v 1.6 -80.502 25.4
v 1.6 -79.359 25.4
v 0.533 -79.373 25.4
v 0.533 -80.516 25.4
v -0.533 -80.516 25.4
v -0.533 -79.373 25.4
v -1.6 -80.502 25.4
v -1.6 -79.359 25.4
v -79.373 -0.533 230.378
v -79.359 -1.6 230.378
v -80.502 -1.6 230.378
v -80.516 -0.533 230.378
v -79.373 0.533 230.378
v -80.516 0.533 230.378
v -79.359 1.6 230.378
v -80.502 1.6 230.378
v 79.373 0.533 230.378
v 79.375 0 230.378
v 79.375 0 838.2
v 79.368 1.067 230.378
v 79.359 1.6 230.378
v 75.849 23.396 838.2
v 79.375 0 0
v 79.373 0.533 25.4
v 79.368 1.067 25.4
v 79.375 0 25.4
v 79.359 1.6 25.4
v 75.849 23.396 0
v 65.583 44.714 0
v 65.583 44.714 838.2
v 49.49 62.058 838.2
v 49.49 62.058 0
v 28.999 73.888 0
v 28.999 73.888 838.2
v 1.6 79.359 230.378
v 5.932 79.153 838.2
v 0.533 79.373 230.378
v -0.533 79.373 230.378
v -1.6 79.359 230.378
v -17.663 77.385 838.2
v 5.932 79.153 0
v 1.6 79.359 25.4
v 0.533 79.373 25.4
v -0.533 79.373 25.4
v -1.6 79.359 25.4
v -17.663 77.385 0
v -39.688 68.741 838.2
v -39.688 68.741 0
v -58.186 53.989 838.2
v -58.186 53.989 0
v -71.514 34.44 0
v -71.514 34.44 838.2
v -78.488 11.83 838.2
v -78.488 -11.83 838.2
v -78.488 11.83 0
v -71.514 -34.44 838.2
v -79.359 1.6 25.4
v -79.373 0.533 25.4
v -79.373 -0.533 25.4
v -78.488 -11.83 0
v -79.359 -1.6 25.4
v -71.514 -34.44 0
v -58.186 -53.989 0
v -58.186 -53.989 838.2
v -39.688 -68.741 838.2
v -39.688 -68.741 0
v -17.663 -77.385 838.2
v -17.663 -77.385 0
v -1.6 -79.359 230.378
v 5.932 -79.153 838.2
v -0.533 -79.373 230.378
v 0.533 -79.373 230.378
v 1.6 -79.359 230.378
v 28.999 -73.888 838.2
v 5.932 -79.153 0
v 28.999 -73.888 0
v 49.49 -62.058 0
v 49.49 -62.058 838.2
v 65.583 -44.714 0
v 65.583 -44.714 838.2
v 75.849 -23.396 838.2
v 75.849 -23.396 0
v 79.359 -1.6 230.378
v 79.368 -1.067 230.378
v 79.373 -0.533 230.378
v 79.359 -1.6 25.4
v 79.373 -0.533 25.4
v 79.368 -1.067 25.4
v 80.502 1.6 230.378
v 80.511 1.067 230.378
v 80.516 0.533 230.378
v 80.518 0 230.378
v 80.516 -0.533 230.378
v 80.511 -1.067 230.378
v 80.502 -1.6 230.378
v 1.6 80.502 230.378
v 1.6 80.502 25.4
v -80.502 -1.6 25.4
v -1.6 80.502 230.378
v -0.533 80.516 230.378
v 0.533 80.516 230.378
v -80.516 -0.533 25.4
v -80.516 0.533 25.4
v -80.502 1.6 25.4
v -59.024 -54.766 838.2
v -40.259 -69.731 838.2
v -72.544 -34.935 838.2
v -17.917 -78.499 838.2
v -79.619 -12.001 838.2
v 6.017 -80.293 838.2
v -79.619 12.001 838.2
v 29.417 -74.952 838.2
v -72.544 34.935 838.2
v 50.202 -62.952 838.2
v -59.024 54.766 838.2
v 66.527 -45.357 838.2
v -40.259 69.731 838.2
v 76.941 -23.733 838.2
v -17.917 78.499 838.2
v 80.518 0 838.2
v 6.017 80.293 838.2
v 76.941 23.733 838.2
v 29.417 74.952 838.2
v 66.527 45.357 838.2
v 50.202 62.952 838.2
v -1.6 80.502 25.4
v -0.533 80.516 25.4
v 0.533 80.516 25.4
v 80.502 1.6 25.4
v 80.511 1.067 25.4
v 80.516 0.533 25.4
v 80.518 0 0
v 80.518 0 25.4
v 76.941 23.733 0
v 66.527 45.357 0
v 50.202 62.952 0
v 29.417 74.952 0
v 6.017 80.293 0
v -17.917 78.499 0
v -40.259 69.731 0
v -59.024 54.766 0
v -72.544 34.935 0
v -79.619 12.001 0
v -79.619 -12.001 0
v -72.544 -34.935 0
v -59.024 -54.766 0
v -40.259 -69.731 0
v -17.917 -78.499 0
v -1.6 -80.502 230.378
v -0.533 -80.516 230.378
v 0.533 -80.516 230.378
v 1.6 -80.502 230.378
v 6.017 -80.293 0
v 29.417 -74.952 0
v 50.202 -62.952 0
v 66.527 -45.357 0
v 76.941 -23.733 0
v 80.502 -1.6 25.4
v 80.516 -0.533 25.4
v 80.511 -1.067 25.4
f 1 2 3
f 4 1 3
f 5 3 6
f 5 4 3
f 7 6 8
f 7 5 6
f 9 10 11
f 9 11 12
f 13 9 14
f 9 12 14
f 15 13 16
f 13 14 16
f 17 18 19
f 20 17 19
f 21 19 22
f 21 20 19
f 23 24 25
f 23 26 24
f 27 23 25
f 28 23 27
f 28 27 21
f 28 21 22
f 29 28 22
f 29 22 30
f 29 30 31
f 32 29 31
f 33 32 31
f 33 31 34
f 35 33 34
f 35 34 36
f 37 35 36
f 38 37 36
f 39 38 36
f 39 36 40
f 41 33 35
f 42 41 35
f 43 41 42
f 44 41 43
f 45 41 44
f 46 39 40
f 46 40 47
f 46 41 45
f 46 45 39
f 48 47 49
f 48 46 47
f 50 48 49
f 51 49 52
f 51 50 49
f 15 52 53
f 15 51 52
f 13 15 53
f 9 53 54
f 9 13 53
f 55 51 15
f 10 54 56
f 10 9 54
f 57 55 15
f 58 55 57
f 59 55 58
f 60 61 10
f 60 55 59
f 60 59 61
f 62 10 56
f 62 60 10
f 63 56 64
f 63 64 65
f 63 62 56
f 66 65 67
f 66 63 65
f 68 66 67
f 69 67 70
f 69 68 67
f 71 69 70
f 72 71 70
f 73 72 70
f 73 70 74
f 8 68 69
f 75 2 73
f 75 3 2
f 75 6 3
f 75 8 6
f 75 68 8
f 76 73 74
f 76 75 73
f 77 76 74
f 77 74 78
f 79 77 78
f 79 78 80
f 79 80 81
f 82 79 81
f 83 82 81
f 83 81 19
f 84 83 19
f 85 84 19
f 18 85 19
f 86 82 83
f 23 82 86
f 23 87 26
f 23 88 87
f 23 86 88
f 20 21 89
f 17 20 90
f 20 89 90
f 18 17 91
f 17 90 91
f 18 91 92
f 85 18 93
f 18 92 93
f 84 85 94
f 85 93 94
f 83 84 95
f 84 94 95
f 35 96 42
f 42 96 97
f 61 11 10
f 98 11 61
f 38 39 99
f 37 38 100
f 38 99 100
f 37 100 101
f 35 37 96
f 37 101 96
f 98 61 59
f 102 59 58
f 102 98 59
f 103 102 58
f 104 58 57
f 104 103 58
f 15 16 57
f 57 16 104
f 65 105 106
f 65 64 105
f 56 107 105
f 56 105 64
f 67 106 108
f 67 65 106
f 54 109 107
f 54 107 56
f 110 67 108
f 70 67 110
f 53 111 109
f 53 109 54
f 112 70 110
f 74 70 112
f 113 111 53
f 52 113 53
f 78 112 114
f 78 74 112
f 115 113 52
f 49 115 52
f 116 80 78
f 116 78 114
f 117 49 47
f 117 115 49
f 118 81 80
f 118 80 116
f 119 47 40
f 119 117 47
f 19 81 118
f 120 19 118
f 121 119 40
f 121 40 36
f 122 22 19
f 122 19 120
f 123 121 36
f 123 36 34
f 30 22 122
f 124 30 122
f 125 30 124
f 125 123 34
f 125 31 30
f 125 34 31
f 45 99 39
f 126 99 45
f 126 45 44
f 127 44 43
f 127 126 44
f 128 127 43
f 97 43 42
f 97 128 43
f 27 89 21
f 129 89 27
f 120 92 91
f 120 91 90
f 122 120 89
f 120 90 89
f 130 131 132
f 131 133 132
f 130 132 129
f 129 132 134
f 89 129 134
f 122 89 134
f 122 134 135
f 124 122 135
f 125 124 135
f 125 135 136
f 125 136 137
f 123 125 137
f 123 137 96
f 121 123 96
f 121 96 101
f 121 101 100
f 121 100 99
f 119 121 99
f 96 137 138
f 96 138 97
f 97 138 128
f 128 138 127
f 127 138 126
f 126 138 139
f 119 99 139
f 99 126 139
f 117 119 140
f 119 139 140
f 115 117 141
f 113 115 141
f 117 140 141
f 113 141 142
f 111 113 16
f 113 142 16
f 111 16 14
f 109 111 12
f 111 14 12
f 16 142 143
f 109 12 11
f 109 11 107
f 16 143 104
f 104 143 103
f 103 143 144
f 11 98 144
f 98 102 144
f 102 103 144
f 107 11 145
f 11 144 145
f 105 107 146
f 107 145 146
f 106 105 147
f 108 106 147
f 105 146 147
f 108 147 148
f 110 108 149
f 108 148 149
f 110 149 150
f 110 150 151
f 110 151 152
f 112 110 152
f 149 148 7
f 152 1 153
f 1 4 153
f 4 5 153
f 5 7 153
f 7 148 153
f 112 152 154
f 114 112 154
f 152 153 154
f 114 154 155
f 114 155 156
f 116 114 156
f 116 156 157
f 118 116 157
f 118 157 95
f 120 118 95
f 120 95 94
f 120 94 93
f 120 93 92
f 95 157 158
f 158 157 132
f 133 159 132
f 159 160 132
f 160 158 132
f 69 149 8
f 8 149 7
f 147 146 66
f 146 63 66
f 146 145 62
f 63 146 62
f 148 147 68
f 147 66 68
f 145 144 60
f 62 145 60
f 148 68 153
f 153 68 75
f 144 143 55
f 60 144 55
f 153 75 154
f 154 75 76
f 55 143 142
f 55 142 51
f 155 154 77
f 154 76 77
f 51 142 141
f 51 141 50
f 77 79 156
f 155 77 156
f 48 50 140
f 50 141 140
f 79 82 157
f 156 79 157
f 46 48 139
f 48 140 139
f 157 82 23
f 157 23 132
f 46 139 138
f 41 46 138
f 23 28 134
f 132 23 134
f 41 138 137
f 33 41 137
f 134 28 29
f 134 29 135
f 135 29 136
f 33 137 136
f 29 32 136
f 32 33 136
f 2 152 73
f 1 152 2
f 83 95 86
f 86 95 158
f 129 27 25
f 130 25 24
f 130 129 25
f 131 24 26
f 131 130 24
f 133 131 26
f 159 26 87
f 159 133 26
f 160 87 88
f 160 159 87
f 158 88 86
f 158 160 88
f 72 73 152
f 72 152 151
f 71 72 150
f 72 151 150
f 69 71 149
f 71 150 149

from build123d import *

# Parameters (mm, degrees)
SKETCH1_R           = 80.518
SKETCH1_R_2         = 79.375
BOSS_EXTRUDE1_DEPTH = 838.2
SKETCH3_W           = 3.2004
SKETCH3_H           = 204.978
CUT_EXTRUDE1_DEPTH  = 1.159132
CIRPATTERN1_COUNT   = 4


with BuildPart() as part:
    # Sketch1 → Boss-Extrude1 (new body)
    with BuildSketch(Plane.XY):
        Circle(SKETCH1_R)
        Circle(SKETCH1_R_2, mode=Mode.SUBTRACT)
    extrude(amount=BOSS_EXTRUDE1_DEPTH)

    # Sketch3 → Cut-Extrude1 (cut)
    with BuildSketch(Plane(origin=(0, 80.518, 0), x_dir=(1, 0, 0), z_dir=(0, 1, 0))):
        with Locations((0, -127.889)):
            Rectangle(SKETCH3_W, SKETCH3_H)
    cut_extrude1 = extrude(amount=-CUT_EXTRUDE1_DEPTH, mode=Mode.SUBTRACT)

    # CirPattern1: Cut-Extrude1 ×4 about axis
    cirpattern1_axis = Axis((0, 0, 0), (0, 0, 1))
    for i in range(1, CIRPATTERN1_COUNT):
        add(cut_extrude1.rotate(cirpattern1_axis, i * 360 / CIRPATTERN1_COUNT), mode=Mode.SUBTRACT)


solid = part.part
